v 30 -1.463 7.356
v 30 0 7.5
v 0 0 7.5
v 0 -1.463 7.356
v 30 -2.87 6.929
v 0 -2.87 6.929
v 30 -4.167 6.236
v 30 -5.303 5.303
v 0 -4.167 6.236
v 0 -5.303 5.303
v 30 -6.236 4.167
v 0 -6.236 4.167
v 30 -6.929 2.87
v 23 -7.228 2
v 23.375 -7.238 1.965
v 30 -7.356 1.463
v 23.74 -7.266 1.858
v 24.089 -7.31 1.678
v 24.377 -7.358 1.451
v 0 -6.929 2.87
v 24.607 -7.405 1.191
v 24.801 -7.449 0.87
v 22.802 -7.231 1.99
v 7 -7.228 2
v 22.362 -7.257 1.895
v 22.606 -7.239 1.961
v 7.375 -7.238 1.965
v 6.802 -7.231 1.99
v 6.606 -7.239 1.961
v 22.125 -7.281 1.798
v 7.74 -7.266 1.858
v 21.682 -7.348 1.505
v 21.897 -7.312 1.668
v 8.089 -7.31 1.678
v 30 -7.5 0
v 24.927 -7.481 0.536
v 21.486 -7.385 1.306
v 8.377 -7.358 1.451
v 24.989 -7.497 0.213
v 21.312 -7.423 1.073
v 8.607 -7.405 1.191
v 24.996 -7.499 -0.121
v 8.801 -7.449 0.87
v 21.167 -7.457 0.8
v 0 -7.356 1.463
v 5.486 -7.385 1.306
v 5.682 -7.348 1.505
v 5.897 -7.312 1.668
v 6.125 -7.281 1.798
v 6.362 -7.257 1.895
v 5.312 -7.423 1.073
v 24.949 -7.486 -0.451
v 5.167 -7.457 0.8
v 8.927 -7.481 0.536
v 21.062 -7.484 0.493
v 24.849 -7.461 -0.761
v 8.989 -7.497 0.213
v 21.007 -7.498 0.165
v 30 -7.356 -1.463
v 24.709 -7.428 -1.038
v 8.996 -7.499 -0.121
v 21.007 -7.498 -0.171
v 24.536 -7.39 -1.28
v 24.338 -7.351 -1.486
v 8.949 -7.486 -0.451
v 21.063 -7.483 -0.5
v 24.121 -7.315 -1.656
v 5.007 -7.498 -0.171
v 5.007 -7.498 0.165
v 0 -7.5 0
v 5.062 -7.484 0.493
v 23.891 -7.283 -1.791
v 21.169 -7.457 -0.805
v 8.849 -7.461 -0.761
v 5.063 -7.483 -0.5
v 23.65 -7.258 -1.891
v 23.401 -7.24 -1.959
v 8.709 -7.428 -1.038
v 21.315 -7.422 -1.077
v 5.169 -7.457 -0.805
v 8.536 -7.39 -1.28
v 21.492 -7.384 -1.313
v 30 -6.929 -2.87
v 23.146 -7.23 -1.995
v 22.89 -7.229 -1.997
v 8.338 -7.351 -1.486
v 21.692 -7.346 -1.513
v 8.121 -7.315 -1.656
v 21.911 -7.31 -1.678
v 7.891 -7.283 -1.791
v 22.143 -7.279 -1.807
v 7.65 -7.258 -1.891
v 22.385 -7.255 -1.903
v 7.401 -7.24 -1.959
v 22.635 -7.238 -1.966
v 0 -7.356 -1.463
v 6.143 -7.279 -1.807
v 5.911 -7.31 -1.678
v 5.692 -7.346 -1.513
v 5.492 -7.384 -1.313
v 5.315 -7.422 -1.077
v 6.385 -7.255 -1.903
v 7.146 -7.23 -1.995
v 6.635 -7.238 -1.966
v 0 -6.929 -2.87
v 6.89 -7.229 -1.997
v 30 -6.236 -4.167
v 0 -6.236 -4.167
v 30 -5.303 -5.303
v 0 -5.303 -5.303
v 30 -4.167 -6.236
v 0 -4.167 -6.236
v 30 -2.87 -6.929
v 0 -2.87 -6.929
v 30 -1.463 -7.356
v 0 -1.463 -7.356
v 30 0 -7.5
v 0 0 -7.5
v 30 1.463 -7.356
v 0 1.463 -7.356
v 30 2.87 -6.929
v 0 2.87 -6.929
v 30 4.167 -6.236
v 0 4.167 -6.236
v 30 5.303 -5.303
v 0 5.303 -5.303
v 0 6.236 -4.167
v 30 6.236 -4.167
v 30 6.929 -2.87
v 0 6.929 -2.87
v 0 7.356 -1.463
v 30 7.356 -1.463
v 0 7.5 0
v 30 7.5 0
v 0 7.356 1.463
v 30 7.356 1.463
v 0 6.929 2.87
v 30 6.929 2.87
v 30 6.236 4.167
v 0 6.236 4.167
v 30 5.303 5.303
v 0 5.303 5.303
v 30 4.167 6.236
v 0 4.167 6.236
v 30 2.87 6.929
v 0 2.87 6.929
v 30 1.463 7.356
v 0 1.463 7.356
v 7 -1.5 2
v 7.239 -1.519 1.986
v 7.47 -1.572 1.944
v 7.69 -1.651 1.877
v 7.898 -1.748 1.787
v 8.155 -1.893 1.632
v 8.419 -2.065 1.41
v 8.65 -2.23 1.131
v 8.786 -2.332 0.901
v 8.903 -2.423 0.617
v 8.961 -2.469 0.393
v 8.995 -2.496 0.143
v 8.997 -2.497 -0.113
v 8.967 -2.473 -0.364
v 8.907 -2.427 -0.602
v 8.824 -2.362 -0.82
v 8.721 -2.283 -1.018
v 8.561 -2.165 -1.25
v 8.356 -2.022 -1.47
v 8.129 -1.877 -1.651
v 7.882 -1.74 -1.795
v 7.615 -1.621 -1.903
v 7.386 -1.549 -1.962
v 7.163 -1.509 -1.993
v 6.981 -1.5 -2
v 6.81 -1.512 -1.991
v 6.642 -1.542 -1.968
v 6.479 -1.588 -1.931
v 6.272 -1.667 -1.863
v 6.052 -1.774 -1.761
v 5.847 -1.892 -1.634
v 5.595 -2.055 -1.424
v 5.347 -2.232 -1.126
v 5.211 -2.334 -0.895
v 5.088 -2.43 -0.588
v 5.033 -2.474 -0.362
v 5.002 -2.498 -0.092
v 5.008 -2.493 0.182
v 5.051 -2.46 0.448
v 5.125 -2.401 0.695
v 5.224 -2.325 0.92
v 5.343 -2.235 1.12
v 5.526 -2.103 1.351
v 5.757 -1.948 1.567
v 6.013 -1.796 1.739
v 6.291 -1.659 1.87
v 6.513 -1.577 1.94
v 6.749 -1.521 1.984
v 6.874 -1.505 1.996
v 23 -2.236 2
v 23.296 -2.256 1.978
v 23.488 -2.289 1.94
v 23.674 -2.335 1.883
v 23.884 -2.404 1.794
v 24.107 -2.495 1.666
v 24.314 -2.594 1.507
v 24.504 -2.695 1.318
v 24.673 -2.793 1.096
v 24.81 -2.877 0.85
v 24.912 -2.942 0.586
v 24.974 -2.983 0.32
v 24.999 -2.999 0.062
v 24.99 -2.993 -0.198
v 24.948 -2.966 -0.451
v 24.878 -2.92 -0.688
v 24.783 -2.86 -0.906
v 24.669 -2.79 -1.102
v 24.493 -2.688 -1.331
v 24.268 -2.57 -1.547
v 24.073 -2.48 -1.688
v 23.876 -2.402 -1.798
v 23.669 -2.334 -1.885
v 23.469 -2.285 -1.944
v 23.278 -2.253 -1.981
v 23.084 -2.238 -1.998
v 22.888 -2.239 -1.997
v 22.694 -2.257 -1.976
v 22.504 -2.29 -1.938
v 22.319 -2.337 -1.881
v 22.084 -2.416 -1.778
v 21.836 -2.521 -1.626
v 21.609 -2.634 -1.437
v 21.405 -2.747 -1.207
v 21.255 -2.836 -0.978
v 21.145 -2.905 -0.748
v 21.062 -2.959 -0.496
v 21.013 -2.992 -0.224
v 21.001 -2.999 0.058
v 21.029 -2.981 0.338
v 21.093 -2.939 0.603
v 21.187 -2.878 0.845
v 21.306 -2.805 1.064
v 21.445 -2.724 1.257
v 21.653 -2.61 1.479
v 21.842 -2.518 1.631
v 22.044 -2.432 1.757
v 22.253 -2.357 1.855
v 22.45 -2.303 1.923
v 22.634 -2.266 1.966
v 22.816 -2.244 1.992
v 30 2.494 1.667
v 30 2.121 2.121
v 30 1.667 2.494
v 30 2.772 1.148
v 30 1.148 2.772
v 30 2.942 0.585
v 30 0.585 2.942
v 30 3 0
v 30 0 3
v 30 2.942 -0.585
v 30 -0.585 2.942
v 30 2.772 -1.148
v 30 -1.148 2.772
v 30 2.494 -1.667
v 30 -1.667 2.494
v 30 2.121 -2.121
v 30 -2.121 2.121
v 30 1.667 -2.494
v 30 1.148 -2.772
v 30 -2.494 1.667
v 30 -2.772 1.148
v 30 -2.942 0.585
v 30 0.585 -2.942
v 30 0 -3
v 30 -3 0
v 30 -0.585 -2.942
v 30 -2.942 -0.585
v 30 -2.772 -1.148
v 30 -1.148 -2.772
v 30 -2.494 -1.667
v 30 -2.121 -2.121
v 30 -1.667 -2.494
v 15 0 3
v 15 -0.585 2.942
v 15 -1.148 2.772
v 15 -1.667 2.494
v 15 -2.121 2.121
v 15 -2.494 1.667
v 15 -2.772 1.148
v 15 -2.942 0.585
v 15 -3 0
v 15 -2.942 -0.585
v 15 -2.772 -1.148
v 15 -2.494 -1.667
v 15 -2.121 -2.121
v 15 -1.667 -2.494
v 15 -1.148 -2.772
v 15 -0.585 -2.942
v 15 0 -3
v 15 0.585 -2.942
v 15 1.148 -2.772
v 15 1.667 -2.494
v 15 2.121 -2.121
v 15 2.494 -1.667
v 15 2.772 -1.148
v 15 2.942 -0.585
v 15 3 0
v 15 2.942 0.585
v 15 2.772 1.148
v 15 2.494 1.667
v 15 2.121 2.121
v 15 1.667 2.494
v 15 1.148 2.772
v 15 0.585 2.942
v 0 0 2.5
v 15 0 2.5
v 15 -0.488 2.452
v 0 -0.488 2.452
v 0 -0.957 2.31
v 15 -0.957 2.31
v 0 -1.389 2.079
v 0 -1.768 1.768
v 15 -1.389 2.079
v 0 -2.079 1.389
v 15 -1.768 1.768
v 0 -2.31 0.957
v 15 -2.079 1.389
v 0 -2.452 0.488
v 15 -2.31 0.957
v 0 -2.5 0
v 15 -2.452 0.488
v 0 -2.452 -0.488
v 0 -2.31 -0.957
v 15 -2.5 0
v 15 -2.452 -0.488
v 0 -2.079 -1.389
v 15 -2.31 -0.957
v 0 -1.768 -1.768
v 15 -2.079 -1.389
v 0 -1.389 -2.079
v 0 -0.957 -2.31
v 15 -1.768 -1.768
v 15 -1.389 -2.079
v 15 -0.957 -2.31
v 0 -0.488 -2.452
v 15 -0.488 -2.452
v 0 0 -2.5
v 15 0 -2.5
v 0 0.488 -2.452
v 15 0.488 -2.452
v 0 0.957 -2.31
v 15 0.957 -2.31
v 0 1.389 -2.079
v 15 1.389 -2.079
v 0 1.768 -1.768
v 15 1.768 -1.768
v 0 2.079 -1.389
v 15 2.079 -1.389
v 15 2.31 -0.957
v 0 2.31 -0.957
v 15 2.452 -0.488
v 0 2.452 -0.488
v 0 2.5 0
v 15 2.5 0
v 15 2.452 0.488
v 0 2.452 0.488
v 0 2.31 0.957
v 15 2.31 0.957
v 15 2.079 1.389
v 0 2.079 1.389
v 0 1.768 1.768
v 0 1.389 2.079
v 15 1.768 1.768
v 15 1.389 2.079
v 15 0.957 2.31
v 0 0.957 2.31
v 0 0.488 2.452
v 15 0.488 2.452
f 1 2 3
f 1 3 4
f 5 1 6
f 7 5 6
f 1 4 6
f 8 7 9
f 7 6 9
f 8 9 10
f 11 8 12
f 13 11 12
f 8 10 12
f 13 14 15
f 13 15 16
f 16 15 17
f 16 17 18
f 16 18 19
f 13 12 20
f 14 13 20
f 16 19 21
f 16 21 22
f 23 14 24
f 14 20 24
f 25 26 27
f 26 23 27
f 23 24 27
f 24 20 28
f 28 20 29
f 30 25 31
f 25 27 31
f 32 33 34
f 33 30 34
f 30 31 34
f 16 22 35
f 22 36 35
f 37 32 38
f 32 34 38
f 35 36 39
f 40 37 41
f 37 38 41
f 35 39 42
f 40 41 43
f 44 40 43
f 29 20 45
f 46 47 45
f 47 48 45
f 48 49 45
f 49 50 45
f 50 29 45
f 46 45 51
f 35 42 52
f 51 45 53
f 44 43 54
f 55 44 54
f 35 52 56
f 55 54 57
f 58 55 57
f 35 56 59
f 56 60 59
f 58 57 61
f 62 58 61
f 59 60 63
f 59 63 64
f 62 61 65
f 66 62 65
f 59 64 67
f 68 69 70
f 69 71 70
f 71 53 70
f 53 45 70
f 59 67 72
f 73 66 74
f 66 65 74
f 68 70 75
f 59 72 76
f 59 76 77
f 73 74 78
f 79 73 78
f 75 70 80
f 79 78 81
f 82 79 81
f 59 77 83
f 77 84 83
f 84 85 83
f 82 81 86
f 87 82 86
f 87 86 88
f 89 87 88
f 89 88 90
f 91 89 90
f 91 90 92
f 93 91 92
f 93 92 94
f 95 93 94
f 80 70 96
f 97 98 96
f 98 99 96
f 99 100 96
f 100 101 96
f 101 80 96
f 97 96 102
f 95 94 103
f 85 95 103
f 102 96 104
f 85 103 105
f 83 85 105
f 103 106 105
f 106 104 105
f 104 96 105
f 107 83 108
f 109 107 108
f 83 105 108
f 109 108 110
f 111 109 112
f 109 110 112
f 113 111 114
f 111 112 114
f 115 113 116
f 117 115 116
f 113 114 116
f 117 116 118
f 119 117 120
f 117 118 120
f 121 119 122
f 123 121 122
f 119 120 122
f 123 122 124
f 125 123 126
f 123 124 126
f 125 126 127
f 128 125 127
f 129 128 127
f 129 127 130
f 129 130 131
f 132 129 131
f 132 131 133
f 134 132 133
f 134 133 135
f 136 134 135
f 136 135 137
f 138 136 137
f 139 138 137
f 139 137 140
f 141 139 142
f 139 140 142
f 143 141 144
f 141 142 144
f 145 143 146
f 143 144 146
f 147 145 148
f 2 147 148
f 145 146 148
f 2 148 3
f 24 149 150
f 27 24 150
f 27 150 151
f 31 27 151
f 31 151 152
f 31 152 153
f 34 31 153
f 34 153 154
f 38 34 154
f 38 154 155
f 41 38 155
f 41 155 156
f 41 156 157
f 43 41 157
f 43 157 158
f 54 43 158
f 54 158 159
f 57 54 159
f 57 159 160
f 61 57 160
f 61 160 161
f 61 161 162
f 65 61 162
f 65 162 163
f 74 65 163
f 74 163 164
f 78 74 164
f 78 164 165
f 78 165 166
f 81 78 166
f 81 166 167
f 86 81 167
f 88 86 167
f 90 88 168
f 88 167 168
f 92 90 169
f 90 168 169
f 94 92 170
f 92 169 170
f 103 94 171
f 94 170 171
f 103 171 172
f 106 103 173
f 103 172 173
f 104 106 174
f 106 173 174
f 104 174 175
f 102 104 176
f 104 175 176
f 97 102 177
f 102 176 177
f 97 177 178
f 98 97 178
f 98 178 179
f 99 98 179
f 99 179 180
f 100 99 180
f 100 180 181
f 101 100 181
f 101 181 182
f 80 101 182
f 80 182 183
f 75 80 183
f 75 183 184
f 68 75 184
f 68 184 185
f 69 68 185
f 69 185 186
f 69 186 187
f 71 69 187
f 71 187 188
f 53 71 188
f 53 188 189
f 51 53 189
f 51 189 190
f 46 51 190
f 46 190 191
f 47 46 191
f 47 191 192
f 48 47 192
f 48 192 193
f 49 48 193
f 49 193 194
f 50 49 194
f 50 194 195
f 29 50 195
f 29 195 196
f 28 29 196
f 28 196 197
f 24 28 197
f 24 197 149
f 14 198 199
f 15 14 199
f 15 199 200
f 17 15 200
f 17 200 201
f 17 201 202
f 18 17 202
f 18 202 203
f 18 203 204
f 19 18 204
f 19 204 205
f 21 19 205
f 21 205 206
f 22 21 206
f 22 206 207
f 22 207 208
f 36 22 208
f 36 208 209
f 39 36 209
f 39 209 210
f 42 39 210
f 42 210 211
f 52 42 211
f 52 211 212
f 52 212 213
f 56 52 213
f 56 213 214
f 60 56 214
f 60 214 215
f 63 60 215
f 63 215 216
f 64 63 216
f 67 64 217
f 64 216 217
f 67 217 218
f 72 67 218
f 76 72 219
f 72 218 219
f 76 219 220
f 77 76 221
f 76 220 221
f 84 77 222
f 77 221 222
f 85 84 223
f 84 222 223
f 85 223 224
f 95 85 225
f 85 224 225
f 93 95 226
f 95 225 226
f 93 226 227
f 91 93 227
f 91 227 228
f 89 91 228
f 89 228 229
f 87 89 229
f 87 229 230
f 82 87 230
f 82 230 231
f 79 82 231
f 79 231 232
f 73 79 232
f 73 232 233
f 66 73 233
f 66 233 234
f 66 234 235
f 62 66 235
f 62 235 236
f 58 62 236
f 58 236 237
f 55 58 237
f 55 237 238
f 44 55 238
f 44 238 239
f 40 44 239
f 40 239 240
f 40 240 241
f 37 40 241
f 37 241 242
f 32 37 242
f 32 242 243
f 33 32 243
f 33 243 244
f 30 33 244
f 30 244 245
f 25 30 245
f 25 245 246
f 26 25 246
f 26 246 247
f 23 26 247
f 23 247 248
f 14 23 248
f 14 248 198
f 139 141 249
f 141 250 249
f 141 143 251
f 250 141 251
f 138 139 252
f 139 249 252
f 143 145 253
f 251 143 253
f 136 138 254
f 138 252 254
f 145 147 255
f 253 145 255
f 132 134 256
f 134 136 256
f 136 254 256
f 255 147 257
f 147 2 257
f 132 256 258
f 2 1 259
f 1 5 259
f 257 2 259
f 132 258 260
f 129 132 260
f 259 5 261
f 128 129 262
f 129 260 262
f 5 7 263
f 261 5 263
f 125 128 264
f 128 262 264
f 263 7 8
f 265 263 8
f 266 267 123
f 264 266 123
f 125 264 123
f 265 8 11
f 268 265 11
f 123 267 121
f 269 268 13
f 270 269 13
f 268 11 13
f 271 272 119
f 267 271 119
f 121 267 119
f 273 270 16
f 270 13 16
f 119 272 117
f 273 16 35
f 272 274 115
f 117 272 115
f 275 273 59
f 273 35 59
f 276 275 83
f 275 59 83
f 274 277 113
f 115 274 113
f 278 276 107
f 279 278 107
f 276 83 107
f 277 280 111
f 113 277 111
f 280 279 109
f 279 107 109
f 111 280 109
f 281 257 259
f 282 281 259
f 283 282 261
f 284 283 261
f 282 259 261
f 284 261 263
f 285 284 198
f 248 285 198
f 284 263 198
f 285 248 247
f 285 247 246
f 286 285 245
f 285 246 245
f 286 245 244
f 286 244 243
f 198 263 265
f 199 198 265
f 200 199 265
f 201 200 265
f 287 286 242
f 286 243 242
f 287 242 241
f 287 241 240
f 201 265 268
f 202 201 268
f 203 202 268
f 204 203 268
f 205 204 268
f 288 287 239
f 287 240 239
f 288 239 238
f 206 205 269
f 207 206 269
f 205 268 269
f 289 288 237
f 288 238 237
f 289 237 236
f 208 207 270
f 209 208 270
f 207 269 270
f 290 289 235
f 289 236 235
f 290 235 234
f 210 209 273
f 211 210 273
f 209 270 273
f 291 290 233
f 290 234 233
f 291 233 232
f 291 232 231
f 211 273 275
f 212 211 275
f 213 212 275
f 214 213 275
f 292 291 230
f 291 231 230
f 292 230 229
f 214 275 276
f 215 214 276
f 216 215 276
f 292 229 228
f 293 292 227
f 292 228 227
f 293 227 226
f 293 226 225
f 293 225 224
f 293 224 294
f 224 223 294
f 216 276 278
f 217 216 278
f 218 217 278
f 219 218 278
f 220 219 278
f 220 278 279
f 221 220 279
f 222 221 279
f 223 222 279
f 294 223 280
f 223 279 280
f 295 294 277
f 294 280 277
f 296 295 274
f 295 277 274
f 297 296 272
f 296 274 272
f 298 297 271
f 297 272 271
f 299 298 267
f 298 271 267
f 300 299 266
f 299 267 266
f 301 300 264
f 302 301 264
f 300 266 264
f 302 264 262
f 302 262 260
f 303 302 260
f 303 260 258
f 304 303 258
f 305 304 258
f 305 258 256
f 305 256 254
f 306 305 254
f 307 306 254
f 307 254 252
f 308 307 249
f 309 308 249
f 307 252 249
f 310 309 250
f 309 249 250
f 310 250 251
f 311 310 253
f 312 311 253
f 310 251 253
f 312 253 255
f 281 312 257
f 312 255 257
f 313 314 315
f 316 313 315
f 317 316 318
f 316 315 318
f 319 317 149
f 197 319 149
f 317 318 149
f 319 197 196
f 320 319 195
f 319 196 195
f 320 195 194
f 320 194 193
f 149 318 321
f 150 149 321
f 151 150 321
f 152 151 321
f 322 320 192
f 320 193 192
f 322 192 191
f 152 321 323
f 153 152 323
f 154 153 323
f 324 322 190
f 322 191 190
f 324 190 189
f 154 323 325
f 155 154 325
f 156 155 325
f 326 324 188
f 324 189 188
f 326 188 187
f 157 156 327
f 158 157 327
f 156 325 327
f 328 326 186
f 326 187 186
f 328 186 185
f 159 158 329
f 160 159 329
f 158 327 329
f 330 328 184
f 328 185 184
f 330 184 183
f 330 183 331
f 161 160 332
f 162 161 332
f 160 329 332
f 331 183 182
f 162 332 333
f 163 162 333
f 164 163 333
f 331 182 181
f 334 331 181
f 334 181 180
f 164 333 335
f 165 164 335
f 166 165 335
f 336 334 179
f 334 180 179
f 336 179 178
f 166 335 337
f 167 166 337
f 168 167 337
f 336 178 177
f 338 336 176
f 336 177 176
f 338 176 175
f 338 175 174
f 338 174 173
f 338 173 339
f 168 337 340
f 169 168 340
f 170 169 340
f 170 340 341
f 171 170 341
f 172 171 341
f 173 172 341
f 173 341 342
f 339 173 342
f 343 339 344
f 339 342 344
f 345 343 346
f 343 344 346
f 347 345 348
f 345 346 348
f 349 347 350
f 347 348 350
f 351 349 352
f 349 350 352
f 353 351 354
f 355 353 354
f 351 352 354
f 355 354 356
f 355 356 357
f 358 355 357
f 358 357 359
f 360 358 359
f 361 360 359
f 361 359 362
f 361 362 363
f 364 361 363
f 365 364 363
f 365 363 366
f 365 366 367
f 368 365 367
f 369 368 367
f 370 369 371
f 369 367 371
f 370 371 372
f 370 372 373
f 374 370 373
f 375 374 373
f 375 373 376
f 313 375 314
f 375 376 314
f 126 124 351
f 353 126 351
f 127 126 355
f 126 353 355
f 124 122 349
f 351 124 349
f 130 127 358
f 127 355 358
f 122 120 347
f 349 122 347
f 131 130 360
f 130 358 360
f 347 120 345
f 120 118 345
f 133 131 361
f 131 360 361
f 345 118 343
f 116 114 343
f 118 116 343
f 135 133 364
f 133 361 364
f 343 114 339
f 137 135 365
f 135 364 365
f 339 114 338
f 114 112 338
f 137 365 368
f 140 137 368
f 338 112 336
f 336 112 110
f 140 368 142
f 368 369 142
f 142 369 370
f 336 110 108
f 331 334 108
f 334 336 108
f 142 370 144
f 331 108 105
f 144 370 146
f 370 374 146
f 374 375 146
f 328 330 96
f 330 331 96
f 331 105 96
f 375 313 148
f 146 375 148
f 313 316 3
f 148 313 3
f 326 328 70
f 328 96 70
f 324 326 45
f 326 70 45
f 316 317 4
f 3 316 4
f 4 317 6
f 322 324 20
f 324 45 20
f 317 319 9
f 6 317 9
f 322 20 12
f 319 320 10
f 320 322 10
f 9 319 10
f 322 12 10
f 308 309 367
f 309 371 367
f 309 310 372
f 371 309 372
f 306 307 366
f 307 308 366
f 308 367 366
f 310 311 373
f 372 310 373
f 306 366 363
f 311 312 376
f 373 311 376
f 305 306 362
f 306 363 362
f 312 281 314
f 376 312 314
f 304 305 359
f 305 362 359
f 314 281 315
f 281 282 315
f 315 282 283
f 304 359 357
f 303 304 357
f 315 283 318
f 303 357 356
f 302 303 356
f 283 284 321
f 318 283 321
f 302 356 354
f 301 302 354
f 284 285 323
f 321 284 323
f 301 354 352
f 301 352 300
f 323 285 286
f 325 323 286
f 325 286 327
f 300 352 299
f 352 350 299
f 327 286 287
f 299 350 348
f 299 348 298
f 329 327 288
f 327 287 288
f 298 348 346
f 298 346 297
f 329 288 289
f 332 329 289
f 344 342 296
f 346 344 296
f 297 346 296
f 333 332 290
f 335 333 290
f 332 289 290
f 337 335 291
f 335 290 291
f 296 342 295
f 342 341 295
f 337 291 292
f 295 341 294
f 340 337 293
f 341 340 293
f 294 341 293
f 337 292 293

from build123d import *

# Parameters (mm, degrees)
ESQUISSE1_W             = 15
ESQUISSE1_H             = 4.5
ESQUISSE2_R             = 2
ENL_V_MAT_EXTRU_1_DEPTH = 32.819805153


with BuildPart() as part:
    # Esquisse1 → Révolution1 (revolve)
    with BuildSketch(Plane.XY, mode=Mode.PRIVATE) as r_volution1_sk:
        Polygon((0, 7.5), (0, 2.5), (15, 2.5), (15, 3), (15, 7.5), align=None)
        with Locations((22.5, 5.25)):
            Rectangle(ESQUISSE1_W, ESQUISSE1_H)
    revolve(r_volution1_sk.sketch.rotate(Axis((-26.945391005, 0, 0), (1, 0, 0)), 90), axis=Axis((-26.945391005, 0, 0), (1, 0, 0)))

    # Esquisse2 → Enlèv. mat.-Extru.1 (cut, through all)
    with BuildSketch(Plane(origin=(0, 0, 0), x_dir=(1, 0, 0), z_dir=(0, 1, 0))):
        with Locations(Location((7, 0, 0), (0, 0, 270))):
            Circle(ESQUISSE2_R)
        with Locations(Location((23, 0, 0), (0, 0, 270))):
            Circle(ESQUISSE2_R)
    extrude(amount=-ENL_V_MAT_EXTRU_1_DEPTH, mode=Mode.SUBTRACT)


solid = part.part
